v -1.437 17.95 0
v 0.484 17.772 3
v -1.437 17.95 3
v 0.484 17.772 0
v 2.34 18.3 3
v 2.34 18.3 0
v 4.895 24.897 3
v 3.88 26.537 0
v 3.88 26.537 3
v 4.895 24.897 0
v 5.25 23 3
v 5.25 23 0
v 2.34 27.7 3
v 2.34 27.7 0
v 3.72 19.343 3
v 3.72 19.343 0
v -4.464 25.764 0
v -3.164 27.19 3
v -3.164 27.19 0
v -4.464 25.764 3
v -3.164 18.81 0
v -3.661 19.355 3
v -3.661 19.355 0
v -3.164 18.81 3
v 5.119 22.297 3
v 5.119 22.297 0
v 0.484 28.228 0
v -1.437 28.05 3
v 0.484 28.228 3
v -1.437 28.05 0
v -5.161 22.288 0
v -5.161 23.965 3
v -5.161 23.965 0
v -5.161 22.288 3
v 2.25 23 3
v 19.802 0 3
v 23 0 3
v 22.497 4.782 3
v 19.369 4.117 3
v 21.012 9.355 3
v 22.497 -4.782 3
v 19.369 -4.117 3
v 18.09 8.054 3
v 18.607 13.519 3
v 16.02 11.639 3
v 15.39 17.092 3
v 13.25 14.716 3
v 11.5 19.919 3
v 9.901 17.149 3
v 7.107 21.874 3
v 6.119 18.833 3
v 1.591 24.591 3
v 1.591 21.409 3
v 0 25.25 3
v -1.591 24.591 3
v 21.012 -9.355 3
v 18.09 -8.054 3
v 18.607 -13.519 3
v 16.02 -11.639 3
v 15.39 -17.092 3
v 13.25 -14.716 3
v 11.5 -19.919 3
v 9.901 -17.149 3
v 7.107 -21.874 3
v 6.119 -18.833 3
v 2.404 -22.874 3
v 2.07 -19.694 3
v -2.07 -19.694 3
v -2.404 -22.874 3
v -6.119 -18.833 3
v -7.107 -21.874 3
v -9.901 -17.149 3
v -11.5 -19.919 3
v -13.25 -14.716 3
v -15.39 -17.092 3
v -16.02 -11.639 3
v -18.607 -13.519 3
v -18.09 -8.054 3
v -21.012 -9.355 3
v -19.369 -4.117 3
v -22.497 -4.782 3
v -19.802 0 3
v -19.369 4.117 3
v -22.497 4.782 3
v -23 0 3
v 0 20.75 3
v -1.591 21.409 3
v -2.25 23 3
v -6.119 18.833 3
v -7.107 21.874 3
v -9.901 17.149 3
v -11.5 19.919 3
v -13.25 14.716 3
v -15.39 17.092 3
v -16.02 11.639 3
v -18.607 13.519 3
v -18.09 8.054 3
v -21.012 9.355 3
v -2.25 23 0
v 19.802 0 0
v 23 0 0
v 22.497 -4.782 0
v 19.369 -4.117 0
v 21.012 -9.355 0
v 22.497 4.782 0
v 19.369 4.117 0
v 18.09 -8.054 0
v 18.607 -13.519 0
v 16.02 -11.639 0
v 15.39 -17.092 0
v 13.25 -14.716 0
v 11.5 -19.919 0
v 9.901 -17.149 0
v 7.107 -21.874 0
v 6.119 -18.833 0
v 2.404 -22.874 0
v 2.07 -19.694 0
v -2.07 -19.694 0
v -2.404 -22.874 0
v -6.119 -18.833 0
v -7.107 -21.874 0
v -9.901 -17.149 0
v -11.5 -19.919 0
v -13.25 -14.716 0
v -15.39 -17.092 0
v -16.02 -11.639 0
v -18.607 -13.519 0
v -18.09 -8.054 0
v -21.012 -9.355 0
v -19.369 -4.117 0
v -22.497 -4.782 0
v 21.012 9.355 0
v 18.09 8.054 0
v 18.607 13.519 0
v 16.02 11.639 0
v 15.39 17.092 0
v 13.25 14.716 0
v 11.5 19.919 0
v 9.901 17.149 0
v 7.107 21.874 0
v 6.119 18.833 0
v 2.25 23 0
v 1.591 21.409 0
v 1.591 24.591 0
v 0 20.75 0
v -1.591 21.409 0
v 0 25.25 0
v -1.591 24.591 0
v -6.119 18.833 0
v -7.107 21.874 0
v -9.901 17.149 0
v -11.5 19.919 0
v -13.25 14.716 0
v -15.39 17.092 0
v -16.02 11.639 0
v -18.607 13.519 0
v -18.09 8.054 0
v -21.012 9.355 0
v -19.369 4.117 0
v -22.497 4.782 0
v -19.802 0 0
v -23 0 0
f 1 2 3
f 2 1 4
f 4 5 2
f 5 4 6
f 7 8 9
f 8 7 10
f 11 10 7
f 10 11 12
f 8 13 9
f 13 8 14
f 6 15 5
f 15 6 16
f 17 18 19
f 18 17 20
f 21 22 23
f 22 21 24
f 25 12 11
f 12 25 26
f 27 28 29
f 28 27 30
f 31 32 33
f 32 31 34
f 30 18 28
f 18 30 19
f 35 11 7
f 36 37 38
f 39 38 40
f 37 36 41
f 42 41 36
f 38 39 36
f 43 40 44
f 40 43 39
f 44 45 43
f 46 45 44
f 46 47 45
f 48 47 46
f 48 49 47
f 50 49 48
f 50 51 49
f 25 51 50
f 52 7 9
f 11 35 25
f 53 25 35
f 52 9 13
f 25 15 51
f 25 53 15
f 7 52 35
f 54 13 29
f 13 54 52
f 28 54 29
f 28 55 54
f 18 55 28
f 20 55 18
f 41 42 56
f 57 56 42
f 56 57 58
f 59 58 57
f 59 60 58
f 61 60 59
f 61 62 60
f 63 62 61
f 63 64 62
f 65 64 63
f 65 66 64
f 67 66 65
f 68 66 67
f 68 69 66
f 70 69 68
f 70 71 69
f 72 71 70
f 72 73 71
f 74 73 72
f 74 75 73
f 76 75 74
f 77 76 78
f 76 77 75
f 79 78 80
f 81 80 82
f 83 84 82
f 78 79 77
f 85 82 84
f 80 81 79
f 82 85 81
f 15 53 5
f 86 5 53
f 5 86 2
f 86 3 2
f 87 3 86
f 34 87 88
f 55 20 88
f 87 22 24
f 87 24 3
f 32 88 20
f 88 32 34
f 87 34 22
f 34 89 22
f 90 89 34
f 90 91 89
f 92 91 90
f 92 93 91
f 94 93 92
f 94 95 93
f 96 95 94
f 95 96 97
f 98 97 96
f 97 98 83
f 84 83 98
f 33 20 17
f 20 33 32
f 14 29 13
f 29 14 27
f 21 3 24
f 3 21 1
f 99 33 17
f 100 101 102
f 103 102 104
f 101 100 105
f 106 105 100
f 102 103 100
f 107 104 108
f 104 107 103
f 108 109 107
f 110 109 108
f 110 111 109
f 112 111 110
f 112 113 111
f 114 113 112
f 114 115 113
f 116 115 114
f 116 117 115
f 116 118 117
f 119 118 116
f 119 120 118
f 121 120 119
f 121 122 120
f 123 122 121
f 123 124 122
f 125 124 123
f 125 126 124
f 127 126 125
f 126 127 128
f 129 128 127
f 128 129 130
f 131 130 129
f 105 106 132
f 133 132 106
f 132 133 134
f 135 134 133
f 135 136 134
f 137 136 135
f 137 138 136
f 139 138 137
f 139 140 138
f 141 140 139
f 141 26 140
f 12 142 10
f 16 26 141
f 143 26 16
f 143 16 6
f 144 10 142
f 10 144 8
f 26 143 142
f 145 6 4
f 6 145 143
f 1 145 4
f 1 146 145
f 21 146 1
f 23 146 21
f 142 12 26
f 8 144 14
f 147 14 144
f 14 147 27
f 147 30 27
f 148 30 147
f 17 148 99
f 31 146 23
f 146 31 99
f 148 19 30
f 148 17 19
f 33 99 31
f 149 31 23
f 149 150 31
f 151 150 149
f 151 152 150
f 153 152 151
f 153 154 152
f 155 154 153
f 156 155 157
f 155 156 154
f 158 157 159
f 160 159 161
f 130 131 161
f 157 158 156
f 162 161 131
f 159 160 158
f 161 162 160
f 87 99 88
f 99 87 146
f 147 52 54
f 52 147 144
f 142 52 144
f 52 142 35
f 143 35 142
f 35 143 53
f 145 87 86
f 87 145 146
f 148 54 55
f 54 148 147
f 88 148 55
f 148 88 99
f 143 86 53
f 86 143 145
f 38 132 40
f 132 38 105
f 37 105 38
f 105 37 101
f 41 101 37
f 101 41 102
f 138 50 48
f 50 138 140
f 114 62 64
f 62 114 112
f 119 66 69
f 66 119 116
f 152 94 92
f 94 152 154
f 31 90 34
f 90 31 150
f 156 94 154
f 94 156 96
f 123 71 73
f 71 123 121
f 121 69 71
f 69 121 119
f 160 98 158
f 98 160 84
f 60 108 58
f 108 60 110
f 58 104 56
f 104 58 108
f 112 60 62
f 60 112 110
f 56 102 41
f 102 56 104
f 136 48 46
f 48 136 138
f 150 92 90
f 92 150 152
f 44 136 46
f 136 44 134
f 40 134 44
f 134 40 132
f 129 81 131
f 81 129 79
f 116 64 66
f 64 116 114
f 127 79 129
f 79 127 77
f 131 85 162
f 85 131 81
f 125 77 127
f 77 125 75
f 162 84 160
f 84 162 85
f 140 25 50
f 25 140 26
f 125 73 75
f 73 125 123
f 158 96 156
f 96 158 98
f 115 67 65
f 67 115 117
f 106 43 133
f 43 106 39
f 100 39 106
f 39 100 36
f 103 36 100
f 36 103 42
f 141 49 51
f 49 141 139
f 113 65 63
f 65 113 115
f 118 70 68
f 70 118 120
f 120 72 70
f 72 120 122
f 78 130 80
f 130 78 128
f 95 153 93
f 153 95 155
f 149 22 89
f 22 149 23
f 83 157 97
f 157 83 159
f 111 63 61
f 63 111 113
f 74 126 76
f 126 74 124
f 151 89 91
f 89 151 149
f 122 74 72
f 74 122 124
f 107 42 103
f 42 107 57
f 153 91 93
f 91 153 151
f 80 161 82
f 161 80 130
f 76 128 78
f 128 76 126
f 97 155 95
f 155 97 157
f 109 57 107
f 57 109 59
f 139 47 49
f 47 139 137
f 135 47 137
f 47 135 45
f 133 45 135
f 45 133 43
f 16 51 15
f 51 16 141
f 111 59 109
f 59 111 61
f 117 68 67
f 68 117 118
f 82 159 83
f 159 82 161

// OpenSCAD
//keychain-Customizable Lithopane by Mark G. Peeters 
//http://www.thingiverse.com/thing:308109
//version 1.3 
//if you are using openSCAD then you are cool! You can get DAT files for local use using this tool
//http://customizer.makerbot.com/image_surface
// i used the nice code for adjusting layers from here:
//http://www.thingiverse.com/thing:74322

// preview[view:south, tilt:top]
//
//
/* [Image] */

// Load a 100x100 pixel image.(images will be stretched to fit) Simple photos work best. Don't forget to click the Invert Colors checkbox! *** ALSO IF YOU HAVE LETTERS IN YOUR IMAGE make sure to reverse the image before uploading so the letters are not backwards.
image_file = "image-surface.dat"; // [image_surface:100x100]

/* [Adjustments] */

//shape NOTE: ALL units are in millimeters (mm)
shape = 0;//[0:circle, 1:square]
//over all size of the keychain. you picked
tag_size = 40;// [20:70]
// size for keyring 4.5 or 5 is good.
ring_hole=4.5;
// What layer height will you slice this at?  The thinner the better.
layer_height = 0.1;
//Use plastic color opacity to set this. The lower the layer height, the more layers you can use. you picked
number_of_layers = 12; // [5:30]
//Width of boarder lining the keychain (3mm is fine)
boarder_width = 3;//
//boarder thickness lining the keychain (at least 3mm for strength)
boarder_thick = 3;//

/* [Hidden] */

// base (white) will always be 2 layers thick
min_layer_height = layer_height*2;
height = layer_height*number_of_layers;
maxheight = height+min_layer_height;


// Make litho and trim bottom and sides
  difference() { //diff 1
  translate([0, 0, min_layer_height]) scale([(tag_size/100),(tag_size/100),height]) surface(file=image_file, center=true, convexity=5); //litosurface moved up min_layer_height
  translate([0,0,-(maxheight)]) linear_extrude(height=maxheight) square(tag_size, center=true);//cutting bottom off surface

if (shape==0) {//you picked circle shape------------------------------------
difference() {  //diff make tube to trim lith
                translate([0, 0, -7]) cylinder(maxheight+15,r= tag_size); //outside
                translate([0, 0, -9]) cylinder(maxheight+18,r= (tag_size/2)); //inside
               } //end diff make tube
translate([0, tag_size/2+boarder_width, -1])cylinder(maxheight+2,r= ring_hole/2); //ring hole
}//end if you picked circle------------------------------------------

if (shape==1) {//you picked square shape------------------------------------
difference() {  //diff make cube to trim litho
                translate([0, 0, -7]) cube(tag_size+15,center=true); //outside
               translate([0, 0, -9]) cube(tag_size,center=true); //inside
               } //end diff make tube
translate([tag_size/2, tag_size/2, -1])cylinder(maxheight+2,r= ring_hole/2); //ring hole
}//end if you picked square

}//end diff 1

//add boarder and loop
if (shape==0) {//you picked circle shape--------------------------
translate([0, tag_size/2+boarder_width, 0]) //move loop
difference(){//make loop
cylinder(boarder_thick,r=boarder_width+ring_hole/2); //ring support
translate([0, 0, -1])cylinder(boarder_thick+2,r= ring_hole/2); //ring hole
}

difference() {  //diff make frame tube
                 cylinder(boarder_thick,r= (tag_size/2)+boarder_width); //outside
                 cylinder(boarder_thick+1,r= (tag_size/2.02)); //inside
translate([0, tag_size/2+boarder_width, -1])cylinder(boarder_thick+2,r= ring_hole/2); //ring hole
                } //end diff make frame tube

}//end if you picked circle------------------------------------------

if (shape==1) {//you picked square shape------------------------------------
translate([tag_size/2, tag_size/2, 0]) //move loop
difference(){//make loop
cylinder(boarder_thick,r=boarder_width+ring_hole/2); //ring support
translate([0, 0, -1])cylinder(boarder_thick+2,r= ring_hole/2); //ring hole
}

difference() {  //diff make frame tube
                 translate([0,0,boarder_thick/2]) cube([tag_size+boarder_width*2,tag_size+boarder_width*2,boarder_thick],center=true); //outside
                 translate([0,0,boarder_thick/2]) cube([tag_size-1,tag_size-1,boarder_thick+1],center=true); //inside
translate([tag_size/2, tag_size/2, -1])cylinder(boarder_thick+2,r= ring_hole/2); //ring hole                
                        } //end diff make frame tube
}//end if you picked square------------------------------------------------
